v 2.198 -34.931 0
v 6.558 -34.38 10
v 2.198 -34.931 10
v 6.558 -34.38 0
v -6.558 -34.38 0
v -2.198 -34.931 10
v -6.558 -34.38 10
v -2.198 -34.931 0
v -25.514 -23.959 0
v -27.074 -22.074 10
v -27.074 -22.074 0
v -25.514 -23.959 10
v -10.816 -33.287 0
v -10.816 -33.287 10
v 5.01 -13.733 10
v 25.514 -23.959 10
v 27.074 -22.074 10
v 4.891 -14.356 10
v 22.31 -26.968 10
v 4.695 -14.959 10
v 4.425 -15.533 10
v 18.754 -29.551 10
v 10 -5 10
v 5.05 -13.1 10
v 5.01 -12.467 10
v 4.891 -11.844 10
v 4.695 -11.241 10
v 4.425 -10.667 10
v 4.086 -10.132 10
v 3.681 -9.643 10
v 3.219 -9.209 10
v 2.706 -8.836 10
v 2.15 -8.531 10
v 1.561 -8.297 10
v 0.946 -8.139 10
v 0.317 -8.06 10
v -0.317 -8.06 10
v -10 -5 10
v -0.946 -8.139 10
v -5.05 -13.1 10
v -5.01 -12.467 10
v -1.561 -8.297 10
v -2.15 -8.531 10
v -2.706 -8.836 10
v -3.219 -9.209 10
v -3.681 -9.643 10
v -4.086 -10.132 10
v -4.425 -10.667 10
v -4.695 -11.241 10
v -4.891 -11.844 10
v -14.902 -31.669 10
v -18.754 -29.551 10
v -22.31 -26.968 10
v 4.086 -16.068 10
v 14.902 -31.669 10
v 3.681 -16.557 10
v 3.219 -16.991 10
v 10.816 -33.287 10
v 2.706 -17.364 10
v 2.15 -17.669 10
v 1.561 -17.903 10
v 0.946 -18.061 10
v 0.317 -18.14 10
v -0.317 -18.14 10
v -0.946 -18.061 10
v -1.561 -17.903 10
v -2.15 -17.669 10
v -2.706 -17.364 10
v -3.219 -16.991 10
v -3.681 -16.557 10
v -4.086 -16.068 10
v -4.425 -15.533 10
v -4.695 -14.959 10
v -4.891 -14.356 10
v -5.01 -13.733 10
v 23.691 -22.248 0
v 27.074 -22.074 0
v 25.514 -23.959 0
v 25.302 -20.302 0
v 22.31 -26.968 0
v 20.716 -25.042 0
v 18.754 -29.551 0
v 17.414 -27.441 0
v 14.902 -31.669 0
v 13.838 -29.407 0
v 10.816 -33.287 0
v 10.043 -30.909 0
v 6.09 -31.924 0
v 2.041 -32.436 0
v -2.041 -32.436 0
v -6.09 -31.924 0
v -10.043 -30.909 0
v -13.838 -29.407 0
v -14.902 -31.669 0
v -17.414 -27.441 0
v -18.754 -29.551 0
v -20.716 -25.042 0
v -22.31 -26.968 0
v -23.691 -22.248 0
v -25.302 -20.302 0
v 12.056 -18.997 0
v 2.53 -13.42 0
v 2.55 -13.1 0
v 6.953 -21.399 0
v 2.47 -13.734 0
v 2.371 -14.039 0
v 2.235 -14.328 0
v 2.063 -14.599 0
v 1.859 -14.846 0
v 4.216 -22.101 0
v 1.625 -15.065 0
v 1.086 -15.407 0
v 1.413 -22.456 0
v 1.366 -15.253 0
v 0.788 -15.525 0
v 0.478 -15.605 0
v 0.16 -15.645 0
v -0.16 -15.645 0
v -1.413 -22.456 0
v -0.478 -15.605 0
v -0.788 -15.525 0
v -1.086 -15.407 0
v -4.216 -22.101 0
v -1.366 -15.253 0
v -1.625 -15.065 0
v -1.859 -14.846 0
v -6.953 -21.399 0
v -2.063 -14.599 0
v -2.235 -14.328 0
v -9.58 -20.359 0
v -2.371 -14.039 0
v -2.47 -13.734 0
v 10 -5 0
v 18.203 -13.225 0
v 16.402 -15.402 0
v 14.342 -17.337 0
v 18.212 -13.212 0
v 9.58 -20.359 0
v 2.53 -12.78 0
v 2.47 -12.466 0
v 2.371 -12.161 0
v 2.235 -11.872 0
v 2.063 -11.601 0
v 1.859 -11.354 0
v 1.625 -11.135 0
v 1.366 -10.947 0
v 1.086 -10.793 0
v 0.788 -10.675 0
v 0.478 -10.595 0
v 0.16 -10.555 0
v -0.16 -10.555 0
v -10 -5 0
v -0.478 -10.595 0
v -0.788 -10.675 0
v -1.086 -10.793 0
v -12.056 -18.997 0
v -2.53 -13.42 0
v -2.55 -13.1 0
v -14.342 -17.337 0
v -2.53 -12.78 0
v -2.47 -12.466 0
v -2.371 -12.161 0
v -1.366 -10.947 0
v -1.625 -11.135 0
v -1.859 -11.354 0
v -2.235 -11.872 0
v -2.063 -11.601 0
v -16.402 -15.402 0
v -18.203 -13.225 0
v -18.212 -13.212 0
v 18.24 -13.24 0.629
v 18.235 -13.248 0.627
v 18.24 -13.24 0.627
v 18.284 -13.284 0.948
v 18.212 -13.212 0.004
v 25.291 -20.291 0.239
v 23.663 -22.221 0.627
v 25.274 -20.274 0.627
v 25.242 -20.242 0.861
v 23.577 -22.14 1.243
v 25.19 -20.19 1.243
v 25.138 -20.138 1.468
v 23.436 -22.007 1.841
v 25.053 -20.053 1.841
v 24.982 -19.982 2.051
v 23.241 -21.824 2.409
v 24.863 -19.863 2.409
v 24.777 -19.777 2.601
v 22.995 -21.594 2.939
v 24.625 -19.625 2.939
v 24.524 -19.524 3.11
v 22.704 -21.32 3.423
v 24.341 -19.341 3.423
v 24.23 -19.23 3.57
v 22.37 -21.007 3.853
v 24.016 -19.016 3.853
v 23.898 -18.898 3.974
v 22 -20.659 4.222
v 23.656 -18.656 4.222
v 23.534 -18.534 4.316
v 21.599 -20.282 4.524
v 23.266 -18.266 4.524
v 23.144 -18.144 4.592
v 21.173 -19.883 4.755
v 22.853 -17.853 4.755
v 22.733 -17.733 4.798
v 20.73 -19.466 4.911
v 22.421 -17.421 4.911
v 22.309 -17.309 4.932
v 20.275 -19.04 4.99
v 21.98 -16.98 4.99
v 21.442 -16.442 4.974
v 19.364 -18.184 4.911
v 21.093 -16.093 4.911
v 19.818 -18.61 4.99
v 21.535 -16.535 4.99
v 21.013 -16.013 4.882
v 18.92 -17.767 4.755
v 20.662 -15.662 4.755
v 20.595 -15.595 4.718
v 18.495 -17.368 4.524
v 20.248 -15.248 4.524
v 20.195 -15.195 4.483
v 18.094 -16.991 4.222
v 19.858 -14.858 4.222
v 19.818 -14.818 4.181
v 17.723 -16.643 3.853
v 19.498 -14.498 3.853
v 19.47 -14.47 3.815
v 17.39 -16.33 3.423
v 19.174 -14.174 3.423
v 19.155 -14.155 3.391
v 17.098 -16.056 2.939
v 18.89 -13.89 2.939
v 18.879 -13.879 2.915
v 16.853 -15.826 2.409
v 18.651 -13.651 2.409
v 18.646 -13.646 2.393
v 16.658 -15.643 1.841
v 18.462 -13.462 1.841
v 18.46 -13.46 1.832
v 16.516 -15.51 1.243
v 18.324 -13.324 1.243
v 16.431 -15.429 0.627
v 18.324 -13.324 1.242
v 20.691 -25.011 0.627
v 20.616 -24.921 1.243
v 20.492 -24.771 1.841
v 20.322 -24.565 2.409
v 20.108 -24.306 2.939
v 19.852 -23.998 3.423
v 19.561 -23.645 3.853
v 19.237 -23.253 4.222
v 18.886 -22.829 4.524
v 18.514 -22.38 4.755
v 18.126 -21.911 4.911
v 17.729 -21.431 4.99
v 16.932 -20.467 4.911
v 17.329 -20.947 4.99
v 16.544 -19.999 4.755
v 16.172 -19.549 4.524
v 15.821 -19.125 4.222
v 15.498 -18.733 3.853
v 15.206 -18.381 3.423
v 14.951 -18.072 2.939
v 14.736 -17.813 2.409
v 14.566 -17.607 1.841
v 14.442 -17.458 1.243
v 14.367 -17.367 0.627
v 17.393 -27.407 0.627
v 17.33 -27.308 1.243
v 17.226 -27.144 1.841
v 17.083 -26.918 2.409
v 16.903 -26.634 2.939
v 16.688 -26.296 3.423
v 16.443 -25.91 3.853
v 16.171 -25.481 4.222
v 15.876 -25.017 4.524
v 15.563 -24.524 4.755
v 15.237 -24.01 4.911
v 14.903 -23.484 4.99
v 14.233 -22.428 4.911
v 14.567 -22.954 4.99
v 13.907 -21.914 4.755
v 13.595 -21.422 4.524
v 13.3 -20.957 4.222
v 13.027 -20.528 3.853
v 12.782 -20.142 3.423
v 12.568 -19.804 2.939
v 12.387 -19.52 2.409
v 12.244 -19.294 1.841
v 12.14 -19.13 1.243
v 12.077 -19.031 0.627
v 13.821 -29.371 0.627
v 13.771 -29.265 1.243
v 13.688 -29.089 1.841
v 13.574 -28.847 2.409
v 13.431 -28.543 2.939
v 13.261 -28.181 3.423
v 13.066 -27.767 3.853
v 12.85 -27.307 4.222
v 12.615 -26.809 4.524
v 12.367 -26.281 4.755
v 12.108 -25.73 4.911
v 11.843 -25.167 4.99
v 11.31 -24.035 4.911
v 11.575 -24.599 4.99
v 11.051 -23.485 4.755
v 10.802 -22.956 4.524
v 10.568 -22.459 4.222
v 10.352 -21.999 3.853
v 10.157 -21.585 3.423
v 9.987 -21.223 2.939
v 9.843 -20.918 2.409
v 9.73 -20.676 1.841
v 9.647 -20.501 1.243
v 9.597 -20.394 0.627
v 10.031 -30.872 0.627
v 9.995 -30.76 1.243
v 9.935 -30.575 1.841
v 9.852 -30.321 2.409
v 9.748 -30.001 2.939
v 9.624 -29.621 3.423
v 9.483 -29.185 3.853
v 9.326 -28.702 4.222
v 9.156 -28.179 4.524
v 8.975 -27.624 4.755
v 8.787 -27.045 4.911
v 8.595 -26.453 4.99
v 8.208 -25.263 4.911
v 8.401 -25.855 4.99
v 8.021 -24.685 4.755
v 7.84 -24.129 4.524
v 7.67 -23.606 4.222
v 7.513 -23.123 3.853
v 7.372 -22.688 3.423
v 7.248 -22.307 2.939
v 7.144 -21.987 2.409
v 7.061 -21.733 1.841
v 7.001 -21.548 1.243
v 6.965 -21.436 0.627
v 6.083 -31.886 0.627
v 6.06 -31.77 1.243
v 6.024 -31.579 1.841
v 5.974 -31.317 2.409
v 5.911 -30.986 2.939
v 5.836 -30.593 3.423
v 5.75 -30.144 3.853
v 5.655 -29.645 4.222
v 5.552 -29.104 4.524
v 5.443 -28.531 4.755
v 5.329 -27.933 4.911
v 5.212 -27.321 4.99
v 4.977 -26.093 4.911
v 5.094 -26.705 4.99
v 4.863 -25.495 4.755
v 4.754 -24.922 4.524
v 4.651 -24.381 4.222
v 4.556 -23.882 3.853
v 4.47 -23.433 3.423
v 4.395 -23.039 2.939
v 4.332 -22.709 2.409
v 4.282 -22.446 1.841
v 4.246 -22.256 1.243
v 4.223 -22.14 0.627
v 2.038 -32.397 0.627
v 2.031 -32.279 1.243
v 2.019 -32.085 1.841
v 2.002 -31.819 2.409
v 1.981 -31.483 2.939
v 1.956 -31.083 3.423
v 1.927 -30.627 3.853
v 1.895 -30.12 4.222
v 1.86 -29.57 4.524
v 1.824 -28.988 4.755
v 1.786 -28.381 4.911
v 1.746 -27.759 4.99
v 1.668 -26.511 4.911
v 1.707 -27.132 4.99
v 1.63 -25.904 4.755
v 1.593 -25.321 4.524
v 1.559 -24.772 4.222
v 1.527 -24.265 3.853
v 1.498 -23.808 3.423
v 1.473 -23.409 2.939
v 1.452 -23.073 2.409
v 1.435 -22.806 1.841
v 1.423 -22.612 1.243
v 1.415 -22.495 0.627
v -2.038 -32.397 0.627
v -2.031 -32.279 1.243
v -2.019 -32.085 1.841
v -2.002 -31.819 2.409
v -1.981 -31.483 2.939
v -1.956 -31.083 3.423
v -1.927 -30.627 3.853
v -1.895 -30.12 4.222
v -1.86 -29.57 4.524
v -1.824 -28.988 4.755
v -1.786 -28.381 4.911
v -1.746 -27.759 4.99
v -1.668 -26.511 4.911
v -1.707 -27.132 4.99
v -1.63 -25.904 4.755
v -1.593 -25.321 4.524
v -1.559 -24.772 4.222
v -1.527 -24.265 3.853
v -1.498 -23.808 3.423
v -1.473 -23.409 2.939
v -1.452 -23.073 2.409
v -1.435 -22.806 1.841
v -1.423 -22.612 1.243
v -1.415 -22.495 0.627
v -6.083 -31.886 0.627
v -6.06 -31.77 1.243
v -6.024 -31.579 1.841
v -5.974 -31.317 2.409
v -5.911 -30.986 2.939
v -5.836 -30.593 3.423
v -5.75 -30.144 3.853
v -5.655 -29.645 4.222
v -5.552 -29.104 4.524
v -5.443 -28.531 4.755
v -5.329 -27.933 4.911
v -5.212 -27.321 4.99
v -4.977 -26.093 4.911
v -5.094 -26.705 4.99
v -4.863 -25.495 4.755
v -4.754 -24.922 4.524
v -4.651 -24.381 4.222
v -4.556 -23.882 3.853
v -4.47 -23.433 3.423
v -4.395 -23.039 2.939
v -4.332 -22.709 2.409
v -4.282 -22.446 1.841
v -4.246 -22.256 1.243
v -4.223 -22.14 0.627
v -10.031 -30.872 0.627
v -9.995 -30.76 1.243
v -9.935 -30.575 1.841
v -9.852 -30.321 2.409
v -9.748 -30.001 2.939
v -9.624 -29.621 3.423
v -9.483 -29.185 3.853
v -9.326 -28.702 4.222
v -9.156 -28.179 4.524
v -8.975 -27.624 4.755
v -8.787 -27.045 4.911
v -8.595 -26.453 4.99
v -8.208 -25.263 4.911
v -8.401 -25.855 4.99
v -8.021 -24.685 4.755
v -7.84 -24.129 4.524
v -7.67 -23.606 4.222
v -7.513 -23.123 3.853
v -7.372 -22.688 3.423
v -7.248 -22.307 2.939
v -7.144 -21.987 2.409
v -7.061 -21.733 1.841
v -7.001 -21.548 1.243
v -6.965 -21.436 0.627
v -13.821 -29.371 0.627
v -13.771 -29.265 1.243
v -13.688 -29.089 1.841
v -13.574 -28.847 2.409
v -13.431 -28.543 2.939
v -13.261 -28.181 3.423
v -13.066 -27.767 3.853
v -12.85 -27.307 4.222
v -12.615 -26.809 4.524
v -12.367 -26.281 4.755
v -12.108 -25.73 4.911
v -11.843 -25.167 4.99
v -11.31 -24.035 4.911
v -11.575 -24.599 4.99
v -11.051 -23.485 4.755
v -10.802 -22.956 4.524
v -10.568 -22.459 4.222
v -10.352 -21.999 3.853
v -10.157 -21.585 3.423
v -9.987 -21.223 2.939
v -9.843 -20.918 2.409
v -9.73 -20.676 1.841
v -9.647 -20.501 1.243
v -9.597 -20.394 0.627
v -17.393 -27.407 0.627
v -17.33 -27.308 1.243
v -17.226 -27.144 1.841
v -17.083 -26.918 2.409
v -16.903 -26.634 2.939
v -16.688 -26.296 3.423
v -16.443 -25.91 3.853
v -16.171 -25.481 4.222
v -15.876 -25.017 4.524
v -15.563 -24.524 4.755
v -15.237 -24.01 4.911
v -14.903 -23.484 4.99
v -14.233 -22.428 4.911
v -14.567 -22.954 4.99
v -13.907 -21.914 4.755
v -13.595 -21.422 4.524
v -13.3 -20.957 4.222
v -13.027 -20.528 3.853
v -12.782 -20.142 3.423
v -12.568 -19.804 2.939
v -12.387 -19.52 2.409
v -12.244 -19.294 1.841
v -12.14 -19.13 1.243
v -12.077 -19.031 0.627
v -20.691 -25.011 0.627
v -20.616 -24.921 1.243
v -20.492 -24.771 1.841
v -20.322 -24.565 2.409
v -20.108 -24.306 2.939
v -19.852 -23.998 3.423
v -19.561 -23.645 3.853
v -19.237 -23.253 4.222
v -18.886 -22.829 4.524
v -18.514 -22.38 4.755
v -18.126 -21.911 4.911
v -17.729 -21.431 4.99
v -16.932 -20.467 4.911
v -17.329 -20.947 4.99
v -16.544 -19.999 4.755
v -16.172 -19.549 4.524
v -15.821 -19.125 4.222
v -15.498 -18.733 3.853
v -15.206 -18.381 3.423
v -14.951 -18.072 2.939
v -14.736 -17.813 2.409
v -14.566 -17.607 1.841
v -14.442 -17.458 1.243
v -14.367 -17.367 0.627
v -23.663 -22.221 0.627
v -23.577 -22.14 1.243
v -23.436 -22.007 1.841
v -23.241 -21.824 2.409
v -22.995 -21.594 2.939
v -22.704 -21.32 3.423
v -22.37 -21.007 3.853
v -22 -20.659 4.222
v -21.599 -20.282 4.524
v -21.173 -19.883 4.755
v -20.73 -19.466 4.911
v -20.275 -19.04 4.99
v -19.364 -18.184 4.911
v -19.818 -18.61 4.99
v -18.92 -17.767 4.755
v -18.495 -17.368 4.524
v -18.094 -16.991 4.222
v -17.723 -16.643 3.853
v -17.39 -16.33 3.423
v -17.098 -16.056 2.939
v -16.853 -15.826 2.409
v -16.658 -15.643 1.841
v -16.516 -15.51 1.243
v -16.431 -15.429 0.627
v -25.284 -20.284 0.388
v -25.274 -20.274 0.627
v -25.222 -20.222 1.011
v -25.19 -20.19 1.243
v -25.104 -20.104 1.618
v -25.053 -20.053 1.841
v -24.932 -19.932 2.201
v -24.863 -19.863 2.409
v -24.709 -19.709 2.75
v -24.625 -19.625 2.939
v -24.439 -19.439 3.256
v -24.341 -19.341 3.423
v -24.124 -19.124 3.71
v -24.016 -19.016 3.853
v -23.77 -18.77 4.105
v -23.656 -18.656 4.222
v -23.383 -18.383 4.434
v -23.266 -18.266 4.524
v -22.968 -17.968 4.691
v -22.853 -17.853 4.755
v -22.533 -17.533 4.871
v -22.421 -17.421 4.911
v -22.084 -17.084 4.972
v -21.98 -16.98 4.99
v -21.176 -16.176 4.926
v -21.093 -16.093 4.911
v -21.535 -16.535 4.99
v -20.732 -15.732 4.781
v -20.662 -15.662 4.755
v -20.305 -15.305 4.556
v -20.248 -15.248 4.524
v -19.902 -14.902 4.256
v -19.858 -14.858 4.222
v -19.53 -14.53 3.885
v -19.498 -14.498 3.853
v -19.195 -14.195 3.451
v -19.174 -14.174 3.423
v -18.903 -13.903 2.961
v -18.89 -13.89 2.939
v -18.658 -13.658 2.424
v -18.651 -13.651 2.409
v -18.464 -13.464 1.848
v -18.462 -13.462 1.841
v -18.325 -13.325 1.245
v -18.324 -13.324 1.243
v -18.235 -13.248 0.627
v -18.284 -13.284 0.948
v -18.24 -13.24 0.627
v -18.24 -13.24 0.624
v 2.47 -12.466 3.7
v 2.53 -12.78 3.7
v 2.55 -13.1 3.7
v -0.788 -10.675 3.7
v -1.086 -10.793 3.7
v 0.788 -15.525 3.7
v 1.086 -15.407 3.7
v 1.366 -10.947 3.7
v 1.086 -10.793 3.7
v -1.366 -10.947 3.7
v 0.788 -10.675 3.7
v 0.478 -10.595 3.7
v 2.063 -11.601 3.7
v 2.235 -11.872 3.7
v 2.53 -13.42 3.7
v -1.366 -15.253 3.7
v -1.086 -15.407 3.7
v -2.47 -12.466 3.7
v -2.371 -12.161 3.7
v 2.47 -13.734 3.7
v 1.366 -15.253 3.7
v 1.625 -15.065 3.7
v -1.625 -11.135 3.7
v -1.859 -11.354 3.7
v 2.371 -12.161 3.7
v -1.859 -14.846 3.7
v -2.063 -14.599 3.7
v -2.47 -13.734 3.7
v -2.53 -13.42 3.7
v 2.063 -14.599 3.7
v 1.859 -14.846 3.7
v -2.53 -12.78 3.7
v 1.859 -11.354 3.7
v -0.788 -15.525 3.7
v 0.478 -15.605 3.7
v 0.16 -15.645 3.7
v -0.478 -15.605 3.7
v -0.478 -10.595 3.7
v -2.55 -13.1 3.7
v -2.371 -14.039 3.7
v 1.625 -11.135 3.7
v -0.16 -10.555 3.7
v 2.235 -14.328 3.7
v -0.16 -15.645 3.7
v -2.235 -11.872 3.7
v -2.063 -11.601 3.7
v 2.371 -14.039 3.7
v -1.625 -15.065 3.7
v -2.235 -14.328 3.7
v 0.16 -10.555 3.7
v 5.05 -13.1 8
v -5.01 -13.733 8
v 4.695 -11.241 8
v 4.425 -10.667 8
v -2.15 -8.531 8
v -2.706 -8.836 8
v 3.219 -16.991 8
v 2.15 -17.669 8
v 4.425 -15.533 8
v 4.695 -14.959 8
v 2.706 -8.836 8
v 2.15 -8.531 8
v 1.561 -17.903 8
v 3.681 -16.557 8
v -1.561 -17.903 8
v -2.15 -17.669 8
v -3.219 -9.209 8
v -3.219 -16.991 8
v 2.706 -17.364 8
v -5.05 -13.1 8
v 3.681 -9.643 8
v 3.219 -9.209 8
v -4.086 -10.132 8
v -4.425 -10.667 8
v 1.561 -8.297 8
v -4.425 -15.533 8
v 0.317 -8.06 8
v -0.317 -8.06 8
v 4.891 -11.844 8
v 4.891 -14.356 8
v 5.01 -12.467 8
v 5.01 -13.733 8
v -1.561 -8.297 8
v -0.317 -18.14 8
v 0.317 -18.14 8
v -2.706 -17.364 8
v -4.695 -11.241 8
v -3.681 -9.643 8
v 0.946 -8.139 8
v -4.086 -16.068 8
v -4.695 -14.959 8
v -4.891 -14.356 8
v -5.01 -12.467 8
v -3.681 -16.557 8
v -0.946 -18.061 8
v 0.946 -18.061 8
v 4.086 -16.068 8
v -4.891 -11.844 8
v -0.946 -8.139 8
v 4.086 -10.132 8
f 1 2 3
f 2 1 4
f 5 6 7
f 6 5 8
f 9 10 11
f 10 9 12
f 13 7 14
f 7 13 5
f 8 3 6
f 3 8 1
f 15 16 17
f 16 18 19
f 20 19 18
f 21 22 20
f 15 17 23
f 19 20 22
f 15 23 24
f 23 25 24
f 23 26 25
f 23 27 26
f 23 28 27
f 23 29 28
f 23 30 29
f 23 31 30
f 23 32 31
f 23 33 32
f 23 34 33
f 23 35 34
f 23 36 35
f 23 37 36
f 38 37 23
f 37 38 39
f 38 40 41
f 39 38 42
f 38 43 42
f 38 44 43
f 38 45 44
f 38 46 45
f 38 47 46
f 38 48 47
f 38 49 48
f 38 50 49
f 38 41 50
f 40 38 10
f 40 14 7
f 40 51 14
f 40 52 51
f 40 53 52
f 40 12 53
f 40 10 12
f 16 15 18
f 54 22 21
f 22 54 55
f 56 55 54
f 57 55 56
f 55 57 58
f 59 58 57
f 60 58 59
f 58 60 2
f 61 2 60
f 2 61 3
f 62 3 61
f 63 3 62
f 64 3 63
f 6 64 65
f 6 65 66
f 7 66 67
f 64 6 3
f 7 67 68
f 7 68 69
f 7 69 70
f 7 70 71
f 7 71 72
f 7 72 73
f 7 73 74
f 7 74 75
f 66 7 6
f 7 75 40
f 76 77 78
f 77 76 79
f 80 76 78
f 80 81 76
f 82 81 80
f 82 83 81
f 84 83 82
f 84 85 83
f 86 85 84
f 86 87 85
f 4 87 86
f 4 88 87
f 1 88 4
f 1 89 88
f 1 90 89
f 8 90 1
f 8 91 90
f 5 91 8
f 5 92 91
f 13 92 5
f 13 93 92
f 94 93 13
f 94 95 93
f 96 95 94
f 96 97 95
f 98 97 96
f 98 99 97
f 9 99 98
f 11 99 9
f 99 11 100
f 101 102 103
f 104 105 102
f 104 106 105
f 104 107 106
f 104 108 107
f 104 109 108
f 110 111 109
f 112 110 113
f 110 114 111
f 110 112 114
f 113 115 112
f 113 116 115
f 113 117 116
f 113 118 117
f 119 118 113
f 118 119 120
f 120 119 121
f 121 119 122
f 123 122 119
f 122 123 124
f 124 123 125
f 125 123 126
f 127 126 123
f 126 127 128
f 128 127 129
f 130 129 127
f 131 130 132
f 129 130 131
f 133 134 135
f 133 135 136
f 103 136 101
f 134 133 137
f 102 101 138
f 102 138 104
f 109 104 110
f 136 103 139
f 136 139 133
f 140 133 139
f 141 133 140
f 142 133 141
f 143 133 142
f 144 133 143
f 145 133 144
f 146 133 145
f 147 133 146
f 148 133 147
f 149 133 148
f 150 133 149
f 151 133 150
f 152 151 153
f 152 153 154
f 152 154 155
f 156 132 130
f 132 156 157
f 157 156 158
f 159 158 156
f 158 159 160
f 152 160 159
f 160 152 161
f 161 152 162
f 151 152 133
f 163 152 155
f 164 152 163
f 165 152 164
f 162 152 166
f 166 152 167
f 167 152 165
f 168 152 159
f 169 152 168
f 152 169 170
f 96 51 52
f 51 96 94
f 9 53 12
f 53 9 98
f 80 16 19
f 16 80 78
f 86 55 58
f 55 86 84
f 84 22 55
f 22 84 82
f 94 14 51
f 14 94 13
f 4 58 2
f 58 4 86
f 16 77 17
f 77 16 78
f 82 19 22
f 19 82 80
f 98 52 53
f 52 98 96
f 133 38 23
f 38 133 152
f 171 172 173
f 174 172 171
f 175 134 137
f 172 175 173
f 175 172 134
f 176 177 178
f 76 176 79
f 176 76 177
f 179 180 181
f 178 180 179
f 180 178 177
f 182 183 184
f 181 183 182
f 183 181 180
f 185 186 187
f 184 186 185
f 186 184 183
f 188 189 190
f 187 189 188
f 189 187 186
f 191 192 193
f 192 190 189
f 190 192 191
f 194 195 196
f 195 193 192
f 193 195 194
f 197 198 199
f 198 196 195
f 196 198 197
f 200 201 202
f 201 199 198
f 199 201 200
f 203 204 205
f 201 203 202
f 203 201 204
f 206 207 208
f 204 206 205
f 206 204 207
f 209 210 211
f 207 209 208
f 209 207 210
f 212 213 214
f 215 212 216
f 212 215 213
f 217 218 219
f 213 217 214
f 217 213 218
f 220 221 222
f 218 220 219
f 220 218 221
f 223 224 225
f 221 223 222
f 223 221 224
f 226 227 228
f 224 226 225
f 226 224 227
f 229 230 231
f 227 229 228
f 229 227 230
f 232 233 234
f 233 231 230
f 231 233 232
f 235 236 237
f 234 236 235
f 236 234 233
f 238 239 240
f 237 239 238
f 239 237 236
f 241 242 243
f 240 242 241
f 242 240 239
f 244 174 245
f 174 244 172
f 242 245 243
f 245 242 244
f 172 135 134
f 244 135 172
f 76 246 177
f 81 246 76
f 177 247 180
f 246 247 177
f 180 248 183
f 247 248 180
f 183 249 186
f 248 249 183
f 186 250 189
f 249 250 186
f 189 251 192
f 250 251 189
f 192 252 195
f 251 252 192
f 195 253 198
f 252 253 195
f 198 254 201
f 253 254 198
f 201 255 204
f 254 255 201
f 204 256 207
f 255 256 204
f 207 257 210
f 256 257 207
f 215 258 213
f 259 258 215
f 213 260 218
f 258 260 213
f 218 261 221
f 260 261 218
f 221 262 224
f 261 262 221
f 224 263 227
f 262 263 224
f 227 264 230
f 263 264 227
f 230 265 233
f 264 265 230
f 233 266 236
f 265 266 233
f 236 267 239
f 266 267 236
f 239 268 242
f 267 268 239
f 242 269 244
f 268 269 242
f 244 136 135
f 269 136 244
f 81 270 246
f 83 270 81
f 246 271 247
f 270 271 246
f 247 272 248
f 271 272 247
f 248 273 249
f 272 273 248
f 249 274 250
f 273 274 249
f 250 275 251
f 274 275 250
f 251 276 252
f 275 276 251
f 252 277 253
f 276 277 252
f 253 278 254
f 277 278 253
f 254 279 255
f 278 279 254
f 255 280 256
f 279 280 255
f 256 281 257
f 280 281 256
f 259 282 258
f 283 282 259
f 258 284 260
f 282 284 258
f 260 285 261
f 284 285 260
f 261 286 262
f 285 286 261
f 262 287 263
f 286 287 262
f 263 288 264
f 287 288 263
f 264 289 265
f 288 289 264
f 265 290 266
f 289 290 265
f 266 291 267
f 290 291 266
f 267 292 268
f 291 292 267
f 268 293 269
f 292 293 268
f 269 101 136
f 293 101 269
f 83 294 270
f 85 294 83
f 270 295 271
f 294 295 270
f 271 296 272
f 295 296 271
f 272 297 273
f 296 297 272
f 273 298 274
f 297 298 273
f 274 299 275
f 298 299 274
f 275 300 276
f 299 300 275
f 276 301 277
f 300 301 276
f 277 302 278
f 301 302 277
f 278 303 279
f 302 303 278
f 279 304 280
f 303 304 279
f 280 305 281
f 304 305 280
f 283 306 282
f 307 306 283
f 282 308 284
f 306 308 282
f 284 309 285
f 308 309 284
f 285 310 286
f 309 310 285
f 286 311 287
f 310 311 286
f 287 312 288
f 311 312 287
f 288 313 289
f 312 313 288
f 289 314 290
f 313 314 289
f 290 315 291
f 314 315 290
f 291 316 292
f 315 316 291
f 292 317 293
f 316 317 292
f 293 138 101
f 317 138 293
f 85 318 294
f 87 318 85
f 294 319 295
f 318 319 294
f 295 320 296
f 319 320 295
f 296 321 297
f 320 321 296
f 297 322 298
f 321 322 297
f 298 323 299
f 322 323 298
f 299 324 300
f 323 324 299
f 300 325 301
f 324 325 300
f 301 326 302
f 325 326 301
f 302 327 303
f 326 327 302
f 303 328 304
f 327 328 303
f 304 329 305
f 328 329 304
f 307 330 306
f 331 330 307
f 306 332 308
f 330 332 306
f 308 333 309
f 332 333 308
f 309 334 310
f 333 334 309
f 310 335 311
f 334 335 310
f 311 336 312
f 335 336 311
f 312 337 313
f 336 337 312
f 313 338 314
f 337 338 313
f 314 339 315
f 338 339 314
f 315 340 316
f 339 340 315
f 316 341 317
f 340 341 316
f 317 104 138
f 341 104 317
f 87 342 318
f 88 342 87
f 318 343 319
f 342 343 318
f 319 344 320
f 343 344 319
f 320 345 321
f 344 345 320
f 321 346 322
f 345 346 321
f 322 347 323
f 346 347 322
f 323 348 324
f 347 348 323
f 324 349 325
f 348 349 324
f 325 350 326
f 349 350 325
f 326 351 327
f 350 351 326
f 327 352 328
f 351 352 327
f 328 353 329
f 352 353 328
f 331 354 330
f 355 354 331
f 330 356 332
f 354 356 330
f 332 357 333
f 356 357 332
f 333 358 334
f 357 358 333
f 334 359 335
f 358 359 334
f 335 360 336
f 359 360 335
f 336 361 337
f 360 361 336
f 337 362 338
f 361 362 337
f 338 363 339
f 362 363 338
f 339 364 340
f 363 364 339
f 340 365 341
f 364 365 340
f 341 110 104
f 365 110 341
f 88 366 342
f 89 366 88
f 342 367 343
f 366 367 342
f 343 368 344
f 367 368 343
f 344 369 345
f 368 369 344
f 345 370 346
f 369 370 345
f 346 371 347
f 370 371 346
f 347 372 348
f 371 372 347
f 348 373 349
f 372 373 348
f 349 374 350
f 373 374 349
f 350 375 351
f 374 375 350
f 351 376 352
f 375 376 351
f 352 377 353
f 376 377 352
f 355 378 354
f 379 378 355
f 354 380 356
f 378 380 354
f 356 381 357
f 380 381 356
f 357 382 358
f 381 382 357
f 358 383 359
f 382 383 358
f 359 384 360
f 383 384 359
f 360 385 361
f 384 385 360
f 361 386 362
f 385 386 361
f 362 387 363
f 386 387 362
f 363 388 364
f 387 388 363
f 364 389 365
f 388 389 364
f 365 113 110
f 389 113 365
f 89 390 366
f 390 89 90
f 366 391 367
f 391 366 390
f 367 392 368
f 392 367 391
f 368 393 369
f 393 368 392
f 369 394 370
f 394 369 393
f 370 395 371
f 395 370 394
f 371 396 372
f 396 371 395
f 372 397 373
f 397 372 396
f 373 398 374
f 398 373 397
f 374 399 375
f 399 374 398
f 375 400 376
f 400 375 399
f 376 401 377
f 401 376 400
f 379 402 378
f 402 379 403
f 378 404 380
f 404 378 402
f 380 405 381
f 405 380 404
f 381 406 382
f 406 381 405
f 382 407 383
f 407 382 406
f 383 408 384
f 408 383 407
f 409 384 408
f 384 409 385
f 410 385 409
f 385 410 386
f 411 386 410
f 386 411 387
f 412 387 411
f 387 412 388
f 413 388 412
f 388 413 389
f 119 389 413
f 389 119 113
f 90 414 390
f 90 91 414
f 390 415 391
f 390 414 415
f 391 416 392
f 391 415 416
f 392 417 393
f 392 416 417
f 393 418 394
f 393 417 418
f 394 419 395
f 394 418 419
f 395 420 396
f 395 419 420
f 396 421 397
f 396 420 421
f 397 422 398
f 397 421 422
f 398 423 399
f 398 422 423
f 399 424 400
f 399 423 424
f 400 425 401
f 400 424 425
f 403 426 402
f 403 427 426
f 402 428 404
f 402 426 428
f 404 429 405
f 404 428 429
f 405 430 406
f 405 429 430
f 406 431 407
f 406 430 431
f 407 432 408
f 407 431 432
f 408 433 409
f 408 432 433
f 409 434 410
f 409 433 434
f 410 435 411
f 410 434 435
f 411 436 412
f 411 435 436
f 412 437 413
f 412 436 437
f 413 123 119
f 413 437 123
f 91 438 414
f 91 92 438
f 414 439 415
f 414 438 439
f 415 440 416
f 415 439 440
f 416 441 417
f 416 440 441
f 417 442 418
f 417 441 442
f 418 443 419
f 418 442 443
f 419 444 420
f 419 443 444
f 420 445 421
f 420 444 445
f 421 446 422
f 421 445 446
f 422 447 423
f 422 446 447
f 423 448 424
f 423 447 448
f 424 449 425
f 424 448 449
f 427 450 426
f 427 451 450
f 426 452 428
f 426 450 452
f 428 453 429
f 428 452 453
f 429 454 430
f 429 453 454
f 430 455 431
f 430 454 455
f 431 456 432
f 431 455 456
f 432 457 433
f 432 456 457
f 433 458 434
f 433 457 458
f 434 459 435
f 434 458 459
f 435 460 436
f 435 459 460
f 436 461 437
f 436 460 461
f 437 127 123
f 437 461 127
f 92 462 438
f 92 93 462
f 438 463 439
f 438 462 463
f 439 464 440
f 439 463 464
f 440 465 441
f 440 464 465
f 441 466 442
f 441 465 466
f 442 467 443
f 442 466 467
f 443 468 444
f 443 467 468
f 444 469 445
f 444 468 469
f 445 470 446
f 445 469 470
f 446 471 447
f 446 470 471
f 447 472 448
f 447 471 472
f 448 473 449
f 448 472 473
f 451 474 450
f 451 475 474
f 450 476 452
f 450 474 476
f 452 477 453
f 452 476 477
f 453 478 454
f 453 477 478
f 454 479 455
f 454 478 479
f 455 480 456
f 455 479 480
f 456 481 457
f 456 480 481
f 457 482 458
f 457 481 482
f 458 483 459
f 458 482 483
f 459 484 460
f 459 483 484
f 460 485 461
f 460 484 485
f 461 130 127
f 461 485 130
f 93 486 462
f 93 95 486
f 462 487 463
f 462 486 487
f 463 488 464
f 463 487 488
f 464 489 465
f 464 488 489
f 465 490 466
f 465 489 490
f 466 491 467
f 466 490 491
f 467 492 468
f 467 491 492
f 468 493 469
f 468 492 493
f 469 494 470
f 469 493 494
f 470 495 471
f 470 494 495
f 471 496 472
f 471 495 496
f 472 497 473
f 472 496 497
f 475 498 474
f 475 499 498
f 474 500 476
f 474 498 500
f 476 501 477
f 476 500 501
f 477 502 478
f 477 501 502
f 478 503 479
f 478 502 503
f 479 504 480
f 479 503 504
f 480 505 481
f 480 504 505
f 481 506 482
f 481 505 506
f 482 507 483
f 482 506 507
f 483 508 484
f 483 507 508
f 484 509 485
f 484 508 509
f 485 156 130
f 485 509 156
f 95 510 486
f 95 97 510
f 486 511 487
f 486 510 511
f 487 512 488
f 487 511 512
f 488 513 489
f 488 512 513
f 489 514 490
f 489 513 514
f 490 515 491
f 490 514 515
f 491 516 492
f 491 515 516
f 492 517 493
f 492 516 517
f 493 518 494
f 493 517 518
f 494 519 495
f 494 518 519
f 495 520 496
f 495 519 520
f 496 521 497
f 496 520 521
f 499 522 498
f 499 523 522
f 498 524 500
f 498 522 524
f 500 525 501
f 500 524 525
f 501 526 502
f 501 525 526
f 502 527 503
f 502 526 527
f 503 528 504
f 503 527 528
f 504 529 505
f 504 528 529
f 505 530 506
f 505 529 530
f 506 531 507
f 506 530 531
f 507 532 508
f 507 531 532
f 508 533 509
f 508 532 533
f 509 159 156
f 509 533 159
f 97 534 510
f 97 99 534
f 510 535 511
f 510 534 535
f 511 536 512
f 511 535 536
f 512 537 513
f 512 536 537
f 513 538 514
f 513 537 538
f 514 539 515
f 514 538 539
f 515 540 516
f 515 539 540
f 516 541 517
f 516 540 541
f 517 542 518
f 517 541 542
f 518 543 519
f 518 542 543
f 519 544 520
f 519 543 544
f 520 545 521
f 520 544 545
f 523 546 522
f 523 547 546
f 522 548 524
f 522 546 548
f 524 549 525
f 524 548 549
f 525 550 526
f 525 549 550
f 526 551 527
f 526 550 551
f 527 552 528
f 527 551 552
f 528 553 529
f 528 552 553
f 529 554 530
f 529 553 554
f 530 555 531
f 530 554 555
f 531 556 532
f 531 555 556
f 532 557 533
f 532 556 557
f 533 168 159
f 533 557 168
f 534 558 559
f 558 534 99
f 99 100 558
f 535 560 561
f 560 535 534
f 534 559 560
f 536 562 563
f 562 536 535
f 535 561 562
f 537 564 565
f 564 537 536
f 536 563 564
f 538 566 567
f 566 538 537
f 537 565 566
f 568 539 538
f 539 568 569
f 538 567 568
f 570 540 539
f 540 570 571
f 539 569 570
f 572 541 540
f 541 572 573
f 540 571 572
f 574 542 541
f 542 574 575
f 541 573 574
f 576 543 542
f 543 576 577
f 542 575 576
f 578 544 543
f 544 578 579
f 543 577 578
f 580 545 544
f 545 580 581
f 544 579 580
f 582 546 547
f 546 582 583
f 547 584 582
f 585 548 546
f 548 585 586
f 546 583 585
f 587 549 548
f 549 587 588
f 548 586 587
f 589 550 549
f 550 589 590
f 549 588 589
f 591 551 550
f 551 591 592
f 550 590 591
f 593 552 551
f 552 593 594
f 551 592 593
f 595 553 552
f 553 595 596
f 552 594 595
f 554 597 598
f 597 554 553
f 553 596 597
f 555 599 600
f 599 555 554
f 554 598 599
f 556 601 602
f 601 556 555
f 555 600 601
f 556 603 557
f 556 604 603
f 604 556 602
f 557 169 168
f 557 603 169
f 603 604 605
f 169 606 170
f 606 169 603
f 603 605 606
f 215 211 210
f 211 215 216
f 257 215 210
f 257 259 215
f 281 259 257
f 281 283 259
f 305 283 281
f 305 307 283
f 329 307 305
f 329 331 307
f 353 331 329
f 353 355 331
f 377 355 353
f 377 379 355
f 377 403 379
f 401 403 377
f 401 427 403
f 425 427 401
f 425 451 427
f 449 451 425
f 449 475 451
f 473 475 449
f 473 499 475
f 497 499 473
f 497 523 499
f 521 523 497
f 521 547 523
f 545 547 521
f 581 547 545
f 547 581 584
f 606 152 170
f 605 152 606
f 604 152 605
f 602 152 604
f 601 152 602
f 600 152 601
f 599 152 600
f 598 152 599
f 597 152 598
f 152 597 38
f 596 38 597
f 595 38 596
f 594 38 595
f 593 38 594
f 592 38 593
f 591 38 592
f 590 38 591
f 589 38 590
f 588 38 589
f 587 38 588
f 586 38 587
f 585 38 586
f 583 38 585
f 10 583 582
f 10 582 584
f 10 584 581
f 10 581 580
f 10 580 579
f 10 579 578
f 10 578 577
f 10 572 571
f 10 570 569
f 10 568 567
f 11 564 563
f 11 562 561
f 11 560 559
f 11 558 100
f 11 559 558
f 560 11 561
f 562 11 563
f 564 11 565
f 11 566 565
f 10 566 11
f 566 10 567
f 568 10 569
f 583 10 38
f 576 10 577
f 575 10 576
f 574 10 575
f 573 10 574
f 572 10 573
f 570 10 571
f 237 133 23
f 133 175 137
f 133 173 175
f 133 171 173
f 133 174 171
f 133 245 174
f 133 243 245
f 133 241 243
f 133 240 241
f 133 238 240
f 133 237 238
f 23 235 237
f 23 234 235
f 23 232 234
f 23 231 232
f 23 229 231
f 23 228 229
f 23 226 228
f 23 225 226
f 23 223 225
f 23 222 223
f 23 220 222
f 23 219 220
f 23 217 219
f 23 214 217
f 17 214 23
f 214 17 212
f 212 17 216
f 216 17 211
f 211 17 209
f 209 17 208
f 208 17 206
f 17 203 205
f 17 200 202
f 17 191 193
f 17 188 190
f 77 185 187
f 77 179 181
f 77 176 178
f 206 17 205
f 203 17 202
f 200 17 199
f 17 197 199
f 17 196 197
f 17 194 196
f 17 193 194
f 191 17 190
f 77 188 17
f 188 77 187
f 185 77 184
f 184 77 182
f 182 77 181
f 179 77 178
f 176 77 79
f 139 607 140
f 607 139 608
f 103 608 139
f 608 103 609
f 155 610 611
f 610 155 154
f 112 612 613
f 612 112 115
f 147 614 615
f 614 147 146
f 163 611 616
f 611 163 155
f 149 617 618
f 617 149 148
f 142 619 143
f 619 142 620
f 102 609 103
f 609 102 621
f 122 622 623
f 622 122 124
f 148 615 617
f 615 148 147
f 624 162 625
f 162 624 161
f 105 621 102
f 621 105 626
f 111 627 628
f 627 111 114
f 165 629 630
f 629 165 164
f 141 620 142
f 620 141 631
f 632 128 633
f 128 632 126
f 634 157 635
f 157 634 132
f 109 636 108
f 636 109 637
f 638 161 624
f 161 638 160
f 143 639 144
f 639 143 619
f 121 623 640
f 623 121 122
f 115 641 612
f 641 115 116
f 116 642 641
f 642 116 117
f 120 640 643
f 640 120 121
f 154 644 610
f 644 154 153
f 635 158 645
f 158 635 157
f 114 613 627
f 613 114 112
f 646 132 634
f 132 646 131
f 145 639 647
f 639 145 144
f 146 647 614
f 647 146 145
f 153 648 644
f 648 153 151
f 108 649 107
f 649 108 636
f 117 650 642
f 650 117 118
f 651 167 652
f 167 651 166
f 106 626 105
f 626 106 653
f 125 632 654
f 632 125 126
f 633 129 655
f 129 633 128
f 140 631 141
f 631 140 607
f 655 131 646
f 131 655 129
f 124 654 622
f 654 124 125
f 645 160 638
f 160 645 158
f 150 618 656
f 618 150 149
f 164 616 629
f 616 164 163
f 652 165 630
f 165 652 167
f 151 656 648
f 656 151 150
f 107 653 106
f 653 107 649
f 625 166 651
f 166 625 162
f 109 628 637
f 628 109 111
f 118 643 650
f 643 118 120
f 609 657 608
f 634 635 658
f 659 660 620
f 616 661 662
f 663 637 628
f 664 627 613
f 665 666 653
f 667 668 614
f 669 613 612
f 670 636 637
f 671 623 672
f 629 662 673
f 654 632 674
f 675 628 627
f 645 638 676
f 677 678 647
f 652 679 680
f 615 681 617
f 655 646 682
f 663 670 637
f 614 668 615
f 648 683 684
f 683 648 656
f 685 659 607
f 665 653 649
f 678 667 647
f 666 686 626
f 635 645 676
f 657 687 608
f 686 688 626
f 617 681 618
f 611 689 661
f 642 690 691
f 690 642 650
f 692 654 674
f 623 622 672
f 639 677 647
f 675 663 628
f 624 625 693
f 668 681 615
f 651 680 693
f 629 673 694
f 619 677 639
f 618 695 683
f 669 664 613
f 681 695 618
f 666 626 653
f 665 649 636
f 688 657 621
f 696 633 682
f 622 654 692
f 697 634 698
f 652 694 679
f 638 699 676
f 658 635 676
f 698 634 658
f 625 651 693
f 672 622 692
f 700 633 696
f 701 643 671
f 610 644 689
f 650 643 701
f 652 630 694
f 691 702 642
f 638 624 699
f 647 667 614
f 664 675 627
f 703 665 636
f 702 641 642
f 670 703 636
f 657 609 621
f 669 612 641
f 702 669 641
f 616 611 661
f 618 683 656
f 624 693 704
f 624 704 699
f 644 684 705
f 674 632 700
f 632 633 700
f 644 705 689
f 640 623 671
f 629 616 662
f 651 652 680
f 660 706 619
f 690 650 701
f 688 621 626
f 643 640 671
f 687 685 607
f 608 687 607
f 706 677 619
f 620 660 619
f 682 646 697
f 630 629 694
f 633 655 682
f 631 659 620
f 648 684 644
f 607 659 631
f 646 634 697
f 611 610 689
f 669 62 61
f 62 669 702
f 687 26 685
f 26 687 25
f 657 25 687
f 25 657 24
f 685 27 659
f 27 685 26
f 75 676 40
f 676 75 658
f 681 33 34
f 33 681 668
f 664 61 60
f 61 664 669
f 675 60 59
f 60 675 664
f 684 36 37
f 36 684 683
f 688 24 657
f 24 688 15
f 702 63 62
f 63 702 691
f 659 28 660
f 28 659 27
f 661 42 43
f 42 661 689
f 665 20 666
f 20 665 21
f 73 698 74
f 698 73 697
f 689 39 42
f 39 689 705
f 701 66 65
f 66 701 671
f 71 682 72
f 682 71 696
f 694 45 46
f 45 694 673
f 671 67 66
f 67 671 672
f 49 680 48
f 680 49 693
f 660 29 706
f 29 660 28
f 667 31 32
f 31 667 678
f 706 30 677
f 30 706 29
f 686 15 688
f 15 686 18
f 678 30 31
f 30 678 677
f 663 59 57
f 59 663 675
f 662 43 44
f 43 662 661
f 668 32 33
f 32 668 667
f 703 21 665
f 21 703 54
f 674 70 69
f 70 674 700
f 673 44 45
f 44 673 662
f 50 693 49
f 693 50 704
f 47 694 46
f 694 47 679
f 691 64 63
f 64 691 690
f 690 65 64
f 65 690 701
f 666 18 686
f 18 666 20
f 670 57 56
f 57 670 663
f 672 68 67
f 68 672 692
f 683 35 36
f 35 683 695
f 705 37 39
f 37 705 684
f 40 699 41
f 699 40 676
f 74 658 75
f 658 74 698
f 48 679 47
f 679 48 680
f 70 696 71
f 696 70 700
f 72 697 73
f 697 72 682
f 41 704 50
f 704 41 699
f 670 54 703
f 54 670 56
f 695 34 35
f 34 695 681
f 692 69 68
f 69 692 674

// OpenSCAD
od = 60;
id = 50;

wt = 5;

hd = 9.5;
hh = 4.3;
hi = 2;
sd = 4.5;

ss = 30;
st = 10;

wa = 45;
wtr = 5;

hdist = 3;

module torus( r1, r2 ){
    rotate_extrude( convexity = 10, $fn = $fn )
        translate( [ r2, 0, 0 ] )
            circle( r = r1, $fn = $fn );
}


difference(){
    cylinder( h = st, d = od + 2 * wt, $fn = 50 );

    translate( [ -50, -( ( od + 2 * wt ) / 2 - ss ) , -1 ] )
        cube( [ 100, 100, 100 ] );
    
    torus( ( od - id ) / 2, ( od + id ) / 4, $fn = 50  );
    
    translate( [ -wtr, 0, 0 ] )
        rotate( wa, [ 0, 0, 1 ] )
            translate( [ -50, 0, -1 ] )
                cube( [ 100, 100, 100 ] );
    translate( [ wtr, 0, 0 ] )
        rotate( -wa, [ 0, 0, 1 ] )
            translate( [ -50, 0, -1 ] )
                cube( [ 100, 100, 100 ] );
    
    translate( [ 0, -( hd + 0.6 ) - hdist, -1 ] )
        cylinder( d = sd + 0.6, h = st + 2, $fn = 50 );
    translate( [ 0, -( hd + 0.6 ) - hdist, st - hh - hi ] )
        cylinder( d2 = hd + 0.6, d1 = sd + 0.6, h = hh, $fn = 50 );
    translate( [ 0, -( hd + 0.6 ) - hdist, st - hi ] )
        cylinder( d = hd + 0.6, h = st, $fn = 50 );
}
